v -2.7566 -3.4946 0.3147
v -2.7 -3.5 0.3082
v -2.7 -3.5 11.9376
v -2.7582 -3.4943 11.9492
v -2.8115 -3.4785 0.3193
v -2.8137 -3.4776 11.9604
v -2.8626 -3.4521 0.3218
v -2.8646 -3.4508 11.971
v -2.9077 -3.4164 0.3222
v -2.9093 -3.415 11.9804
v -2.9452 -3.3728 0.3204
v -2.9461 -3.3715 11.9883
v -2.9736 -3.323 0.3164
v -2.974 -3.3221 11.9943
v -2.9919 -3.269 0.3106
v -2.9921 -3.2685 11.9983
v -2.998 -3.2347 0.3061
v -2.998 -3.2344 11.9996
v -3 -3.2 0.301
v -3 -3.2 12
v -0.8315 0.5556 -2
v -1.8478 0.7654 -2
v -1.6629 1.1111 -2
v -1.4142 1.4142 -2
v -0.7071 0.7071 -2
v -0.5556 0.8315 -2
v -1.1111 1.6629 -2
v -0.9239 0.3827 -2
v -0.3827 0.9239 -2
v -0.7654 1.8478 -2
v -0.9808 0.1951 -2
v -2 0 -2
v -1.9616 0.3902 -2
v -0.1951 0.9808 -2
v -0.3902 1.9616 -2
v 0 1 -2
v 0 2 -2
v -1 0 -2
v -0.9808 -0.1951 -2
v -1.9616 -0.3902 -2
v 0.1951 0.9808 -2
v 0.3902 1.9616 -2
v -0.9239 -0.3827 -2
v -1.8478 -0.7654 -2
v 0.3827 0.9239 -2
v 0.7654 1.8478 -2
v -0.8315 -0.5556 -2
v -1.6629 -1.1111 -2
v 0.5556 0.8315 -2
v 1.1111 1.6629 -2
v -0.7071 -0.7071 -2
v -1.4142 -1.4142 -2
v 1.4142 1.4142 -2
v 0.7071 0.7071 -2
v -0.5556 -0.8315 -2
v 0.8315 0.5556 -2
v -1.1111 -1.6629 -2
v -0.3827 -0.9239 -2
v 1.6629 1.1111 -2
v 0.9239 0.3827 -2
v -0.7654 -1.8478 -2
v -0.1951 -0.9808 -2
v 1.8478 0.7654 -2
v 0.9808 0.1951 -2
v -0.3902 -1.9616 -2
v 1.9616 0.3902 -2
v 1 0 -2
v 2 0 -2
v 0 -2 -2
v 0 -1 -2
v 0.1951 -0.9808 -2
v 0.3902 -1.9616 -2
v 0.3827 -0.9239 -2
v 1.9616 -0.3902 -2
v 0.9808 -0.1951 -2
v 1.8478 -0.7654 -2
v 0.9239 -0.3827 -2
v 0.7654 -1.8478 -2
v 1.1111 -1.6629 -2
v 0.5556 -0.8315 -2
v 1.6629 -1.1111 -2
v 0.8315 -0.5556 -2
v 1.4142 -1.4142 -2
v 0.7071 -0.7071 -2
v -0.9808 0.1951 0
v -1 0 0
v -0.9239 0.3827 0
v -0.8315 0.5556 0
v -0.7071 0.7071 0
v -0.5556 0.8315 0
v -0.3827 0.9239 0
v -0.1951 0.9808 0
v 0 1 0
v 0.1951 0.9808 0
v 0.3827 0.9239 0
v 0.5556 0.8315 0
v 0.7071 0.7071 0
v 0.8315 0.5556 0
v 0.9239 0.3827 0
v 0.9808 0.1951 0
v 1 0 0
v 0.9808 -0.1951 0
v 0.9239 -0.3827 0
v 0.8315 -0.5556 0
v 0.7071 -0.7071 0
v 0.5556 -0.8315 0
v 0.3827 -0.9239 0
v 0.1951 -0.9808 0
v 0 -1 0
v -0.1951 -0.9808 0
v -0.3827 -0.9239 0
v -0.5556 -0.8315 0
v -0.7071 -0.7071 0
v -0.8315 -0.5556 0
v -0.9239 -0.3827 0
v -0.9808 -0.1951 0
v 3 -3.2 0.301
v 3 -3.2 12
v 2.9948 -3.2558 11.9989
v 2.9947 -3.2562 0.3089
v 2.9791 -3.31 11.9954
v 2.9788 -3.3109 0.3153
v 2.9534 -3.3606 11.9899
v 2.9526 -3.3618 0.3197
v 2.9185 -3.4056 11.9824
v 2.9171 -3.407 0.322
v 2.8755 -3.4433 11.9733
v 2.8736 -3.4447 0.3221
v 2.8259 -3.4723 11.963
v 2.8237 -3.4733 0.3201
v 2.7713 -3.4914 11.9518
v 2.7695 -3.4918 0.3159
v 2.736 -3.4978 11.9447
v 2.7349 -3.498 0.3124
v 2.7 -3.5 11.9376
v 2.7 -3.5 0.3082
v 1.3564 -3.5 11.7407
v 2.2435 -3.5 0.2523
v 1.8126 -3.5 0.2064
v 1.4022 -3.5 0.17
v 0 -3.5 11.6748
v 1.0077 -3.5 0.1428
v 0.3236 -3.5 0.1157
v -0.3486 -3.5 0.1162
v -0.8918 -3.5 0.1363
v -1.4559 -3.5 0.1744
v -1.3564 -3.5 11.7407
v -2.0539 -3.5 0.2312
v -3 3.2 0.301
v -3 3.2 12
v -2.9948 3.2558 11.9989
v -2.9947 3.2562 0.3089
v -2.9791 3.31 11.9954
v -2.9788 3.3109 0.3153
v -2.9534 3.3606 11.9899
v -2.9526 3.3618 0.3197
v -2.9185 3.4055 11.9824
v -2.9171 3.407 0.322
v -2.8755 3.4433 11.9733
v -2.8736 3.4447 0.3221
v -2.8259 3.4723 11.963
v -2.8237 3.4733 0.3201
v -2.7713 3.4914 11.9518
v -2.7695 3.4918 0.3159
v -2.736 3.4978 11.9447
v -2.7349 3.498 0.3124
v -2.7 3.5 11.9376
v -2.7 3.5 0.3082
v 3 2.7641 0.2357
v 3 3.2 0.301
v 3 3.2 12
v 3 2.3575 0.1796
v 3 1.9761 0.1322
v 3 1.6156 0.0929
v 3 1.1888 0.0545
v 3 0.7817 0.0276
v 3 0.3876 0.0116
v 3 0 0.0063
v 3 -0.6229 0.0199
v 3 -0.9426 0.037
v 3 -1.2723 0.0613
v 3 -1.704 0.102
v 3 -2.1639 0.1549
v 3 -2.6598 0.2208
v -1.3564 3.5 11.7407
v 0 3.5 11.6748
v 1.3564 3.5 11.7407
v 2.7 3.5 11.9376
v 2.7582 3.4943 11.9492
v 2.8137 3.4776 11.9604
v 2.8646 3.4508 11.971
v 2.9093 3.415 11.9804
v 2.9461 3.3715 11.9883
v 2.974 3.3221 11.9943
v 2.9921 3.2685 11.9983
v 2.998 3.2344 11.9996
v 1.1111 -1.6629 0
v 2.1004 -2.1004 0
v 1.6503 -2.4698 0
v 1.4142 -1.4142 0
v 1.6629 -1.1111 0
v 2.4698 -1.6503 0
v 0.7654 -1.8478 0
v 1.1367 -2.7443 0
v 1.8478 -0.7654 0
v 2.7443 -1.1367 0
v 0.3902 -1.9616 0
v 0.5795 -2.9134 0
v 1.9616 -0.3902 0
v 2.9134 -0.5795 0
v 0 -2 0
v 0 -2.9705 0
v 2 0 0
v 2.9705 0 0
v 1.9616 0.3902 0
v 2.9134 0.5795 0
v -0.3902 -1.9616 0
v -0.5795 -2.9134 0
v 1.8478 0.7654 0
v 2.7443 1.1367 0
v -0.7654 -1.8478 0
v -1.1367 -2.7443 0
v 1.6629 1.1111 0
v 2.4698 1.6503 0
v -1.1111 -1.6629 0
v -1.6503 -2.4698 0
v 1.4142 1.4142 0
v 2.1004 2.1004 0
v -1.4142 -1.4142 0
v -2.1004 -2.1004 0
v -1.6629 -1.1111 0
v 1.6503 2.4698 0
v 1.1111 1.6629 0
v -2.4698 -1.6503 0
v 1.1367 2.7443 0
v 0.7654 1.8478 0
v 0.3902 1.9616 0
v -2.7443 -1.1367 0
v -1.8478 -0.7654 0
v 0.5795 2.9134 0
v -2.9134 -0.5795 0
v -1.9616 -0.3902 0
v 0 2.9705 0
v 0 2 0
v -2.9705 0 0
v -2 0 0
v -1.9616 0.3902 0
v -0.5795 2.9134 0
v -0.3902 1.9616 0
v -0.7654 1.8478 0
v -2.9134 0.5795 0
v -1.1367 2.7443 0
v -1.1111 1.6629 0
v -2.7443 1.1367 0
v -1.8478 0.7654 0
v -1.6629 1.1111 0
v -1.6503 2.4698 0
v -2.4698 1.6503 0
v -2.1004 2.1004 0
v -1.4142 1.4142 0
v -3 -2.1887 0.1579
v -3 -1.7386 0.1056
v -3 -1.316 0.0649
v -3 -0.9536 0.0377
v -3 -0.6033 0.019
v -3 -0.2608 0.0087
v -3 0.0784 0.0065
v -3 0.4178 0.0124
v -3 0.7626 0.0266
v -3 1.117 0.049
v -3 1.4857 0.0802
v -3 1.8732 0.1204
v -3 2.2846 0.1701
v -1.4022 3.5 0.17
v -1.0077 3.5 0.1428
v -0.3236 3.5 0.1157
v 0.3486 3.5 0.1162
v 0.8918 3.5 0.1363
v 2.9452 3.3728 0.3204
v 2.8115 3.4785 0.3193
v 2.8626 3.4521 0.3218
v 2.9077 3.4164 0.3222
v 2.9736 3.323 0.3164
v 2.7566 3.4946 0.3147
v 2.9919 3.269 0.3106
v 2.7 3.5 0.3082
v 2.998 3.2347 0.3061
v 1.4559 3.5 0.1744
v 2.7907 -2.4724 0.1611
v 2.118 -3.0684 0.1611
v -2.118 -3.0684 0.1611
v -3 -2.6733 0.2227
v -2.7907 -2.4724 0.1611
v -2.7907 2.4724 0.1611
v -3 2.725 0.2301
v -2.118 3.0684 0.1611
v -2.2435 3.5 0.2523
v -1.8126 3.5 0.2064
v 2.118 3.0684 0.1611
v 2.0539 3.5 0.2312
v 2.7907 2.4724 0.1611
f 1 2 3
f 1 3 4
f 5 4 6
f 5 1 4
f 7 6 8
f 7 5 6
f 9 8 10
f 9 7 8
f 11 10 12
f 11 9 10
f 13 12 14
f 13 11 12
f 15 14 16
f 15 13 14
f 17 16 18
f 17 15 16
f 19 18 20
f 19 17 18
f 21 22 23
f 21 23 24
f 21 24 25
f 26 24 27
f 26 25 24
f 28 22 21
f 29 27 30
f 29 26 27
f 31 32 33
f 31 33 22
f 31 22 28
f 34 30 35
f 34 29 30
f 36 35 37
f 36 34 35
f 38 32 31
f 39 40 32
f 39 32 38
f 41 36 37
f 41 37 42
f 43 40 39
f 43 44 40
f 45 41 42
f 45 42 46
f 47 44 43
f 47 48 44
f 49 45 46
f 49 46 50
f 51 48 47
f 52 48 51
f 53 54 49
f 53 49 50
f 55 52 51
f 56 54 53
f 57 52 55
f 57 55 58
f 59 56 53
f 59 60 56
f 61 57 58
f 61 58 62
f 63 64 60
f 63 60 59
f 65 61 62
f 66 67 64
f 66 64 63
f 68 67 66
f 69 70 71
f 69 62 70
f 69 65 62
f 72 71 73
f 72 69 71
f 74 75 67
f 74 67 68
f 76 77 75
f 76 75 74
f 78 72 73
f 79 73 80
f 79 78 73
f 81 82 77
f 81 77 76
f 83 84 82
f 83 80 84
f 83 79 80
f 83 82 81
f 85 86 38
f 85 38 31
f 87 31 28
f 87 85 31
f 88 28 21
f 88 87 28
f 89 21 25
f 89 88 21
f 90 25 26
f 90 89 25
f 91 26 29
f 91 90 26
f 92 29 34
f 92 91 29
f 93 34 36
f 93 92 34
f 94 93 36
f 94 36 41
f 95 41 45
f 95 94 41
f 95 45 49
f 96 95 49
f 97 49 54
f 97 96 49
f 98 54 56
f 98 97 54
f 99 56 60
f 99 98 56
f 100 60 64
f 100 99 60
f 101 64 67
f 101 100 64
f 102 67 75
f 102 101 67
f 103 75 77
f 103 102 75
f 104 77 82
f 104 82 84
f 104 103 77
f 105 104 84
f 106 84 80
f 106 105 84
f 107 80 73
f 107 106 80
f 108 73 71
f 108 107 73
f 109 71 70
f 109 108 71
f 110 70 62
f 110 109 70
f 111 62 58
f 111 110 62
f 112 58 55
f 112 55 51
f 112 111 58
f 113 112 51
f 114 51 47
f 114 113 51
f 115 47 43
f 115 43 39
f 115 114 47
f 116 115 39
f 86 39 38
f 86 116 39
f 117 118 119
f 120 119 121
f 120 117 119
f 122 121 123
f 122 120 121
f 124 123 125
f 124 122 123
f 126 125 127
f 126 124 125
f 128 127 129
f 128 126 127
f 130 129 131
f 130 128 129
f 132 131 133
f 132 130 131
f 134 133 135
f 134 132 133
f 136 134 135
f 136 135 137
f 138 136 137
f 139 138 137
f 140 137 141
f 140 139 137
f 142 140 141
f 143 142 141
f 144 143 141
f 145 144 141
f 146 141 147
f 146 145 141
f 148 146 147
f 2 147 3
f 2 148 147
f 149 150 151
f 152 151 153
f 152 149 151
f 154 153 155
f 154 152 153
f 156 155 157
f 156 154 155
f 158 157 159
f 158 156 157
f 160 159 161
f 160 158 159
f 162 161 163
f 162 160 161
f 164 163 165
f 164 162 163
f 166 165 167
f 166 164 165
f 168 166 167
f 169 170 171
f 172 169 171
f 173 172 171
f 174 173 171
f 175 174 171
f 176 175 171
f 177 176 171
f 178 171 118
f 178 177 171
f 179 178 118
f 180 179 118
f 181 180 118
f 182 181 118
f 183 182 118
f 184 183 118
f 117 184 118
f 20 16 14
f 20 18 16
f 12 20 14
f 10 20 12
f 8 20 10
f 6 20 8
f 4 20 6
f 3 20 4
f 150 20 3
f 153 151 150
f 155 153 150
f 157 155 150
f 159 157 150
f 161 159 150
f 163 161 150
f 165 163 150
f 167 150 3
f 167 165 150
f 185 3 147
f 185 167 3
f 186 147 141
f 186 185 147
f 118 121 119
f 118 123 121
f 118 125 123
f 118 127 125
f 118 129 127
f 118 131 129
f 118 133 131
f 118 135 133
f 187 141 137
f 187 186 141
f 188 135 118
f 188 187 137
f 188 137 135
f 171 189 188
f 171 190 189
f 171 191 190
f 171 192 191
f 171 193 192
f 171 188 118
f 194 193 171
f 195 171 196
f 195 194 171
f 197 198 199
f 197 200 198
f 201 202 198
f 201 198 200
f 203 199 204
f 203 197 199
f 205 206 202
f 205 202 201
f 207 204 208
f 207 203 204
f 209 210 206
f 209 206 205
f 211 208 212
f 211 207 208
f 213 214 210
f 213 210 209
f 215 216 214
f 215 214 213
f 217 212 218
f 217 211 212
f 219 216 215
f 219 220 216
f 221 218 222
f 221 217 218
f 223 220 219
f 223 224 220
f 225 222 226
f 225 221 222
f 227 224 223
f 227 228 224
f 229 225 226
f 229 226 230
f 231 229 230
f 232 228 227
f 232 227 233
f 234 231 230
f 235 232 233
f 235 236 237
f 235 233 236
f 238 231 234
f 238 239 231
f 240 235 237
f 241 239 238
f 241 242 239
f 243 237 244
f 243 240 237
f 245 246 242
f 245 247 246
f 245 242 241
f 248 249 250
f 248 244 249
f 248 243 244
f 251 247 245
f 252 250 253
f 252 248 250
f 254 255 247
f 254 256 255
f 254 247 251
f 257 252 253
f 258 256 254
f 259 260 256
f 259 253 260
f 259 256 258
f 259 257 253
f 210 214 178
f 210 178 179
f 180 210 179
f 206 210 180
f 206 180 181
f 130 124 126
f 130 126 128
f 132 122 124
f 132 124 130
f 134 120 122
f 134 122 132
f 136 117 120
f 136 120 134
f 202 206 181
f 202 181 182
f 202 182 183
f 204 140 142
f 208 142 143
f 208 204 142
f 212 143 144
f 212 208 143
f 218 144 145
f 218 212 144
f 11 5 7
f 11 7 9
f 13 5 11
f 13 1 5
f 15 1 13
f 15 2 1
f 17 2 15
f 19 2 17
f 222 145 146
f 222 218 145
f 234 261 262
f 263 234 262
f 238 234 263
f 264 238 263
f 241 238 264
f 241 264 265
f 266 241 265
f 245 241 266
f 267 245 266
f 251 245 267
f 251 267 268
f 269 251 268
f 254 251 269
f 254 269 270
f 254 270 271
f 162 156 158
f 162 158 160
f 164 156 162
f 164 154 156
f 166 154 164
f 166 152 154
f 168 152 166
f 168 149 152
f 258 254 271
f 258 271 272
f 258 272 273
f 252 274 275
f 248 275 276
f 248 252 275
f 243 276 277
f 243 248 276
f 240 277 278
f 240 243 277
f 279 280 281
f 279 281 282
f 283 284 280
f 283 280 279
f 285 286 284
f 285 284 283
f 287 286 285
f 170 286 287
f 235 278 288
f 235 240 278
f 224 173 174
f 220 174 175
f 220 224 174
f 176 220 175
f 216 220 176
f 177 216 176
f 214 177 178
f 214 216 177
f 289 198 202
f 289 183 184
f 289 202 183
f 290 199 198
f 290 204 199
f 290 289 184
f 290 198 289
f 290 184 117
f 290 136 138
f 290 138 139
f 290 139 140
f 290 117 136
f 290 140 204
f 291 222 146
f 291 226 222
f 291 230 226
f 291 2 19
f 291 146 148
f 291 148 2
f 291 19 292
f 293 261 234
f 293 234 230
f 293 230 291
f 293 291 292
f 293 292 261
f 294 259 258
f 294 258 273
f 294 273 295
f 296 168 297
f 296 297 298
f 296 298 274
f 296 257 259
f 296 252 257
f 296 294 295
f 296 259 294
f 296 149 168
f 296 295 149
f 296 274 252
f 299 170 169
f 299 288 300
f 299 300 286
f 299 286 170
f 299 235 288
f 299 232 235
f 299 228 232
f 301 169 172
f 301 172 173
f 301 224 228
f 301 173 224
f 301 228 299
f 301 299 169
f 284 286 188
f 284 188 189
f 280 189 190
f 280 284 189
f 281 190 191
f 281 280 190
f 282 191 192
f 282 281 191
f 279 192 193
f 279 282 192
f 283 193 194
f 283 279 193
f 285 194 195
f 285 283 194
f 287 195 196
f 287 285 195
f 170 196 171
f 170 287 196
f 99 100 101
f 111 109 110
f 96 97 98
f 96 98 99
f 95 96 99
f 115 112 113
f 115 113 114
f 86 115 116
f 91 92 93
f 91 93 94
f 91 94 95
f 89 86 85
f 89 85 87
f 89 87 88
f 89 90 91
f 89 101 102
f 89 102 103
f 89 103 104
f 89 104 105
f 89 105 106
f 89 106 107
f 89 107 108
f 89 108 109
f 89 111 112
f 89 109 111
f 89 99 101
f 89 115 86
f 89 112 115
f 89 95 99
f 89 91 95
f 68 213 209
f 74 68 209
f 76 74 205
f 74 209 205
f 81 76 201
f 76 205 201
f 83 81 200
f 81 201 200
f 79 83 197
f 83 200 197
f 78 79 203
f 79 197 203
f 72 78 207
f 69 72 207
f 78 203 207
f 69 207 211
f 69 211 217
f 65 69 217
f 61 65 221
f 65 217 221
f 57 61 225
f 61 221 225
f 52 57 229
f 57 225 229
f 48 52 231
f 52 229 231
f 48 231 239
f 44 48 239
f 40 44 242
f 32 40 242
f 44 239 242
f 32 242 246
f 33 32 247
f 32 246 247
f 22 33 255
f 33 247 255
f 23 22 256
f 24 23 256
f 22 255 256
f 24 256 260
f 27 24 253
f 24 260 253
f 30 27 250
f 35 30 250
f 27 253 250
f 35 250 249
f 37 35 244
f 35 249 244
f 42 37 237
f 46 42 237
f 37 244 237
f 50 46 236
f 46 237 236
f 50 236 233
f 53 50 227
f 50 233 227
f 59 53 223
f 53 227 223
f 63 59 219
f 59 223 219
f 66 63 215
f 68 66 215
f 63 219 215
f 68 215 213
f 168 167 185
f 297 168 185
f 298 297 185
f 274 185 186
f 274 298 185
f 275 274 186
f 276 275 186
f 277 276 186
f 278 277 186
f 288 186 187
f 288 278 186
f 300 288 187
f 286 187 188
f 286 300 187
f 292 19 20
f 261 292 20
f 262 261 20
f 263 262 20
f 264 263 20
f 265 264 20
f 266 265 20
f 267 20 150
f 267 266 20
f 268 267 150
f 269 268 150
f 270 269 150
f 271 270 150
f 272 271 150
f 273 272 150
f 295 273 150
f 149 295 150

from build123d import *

# Parameters (mm, degrees)
EXTRUSION1_DEPTH        = 12
ENL_V_MAT_EXTRU_1_DEPTH = 6
ESQUISSE3_R             = 2
ESQUISSE3_R_2           = 1
EXTRUSION2_DEPTH        = 2


with BuildPart() as part:
    # Esquisse1 → Extrusion1 (new body)
    with BuildSketch(Plane.XY):
        with BuildLine():
            Line((-2.7, 3.5), (2.7, 3.5))
            ThreePointArc((2.7, 3.5), (2.912132034, 3.412132034), (3, 3.2))
            Line((3, 3.2), (3, -3.2))
            ThreePointArc((3, -3.2), (2.912132034, -3.412132034), (2.7, -3.5))
            Line((2.7, -3.5), (-2.7, -3.5))
            ThreePointArc((-2.7, -3.5), (-2.912132034, -3.412132034), (-3, -3.2))
            Line((-3, -3.2), (-3, 3.2))
            ThreePointArc((-3, 3.2), (-2.912132034, 3.412132034), (-2.7, 3.5))
        make_face()
    extrude(amount=EXTRUSION1_DEPTH)

    # Esquisse2 → Enlèv. mat.-Extru.1 (cut, symmetric)
    with BuildSketch(Plane(origin=(0, 0, 0), x_dir=(1, 0, 0), z_dir=(0, 1, 0))):
        with BuildLine():
            Line((14, -25.674794331), (-14, -25.674794331))
            ThreePointArc((-14, -25.674794331), (0, -11.674794331), (14, -25.674794331))
        make_face()
    extrude(amount=ENL_V_MAT_EXTRU_1_DEPTH, both=True, mode=Mode.SUBTRACT)

    # Esquisse3 → Extrusion2 (add)
    with BuildSketch(Plane(origin=(0, 0, 0), x_dir=(-1, 0, 0), z_dir=(0, 0, -1))):
        with Locations(Location((0, 0, 0), (0, 0, 180))):
            Circle(ESQUISSE3_R)
        Circle(ESQUISSE3_R_2, mode=Mode.SUBTRACT)
    extrude(amount=EXTRUSION2_DEPTH)

    # Esquisse4 → Enlèvement de matière-Révolution1 (revolve, cut)
    with BuildSketch(Plane(origin=(0, 0, 0), x_dir=(1, 0, 0), z_dir=(0, 1, 0)), mode=Mode.PRIVATE) as enl_vement_de_mati_re_r_volution1_sk:
        Polygon((-5.932823797, -0.629669223), (-2.5, 0.1), (-2.5, 1.1), (-5.932823797, 1.1), align=None)
    revolve(enl_vement_de_mati_re_r_volution1_sk.sketch.rotate(Axis((0, 0, 13.123822536), (0, 0, -1)), 180), axis=Axis((0, 0, 13.123822536), (0, 0, -1)), mode=Mode.SUBTRACT)


solid = part.part
